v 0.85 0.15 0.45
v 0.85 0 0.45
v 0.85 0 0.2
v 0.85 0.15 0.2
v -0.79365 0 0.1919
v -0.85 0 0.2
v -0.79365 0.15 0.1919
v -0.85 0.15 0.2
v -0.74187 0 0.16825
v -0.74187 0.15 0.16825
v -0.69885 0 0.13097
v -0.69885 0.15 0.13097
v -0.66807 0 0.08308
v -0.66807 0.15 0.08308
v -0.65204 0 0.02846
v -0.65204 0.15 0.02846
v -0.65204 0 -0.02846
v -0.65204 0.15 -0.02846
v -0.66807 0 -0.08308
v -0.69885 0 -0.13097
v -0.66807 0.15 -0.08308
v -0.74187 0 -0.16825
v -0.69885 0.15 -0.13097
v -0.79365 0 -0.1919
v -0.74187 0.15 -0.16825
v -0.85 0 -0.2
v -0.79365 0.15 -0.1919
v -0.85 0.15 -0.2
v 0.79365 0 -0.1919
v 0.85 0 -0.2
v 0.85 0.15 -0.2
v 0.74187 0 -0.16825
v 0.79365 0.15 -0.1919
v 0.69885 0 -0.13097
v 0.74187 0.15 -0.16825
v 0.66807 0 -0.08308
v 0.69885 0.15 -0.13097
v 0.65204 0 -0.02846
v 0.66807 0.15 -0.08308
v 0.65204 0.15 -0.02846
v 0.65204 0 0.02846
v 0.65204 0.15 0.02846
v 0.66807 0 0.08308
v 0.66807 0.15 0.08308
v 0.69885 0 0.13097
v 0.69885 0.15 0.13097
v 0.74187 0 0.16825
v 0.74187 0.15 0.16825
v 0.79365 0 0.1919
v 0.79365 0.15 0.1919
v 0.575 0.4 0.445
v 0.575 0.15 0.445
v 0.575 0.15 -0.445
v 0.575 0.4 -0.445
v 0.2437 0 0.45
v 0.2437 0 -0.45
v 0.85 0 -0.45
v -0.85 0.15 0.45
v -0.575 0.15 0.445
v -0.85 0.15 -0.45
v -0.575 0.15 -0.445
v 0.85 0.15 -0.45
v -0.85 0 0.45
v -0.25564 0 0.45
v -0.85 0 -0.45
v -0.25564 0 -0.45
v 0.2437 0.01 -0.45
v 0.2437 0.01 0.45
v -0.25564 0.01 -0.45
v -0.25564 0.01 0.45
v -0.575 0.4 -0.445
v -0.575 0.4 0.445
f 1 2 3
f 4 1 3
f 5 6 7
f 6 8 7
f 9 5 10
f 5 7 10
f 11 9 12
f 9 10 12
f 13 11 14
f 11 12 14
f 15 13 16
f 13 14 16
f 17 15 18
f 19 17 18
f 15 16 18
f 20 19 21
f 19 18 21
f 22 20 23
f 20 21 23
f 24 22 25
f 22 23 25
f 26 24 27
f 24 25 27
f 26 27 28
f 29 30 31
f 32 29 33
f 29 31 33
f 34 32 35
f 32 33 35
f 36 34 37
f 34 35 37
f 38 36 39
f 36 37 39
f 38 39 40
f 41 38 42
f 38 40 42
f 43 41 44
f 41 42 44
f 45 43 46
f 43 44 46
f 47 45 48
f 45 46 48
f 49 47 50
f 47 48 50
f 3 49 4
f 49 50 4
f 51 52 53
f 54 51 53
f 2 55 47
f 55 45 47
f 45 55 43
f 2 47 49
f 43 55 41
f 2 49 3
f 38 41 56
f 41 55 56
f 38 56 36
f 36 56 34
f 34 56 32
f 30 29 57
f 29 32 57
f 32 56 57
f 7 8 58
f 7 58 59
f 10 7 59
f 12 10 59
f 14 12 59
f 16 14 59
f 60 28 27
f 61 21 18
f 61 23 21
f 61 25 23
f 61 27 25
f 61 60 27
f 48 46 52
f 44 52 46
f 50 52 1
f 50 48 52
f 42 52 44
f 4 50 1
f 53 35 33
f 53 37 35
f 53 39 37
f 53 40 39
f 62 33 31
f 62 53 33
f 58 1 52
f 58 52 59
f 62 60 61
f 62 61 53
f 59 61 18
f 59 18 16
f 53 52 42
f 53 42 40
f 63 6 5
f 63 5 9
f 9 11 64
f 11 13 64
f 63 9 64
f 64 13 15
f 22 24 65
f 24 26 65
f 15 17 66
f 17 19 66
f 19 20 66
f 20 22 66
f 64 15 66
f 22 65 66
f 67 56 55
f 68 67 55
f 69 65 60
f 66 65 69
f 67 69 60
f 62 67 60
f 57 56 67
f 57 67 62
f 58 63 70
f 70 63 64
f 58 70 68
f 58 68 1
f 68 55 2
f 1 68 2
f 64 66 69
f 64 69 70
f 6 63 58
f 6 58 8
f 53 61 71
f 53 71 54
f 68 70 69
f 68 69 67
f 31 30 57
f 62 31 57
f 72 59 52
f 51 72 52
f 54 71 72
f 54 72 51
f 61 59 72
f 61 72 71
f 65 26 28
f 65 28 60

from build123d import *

# Parameters (mm, degrees)
SKETCH1_W           = 1.7
SKETCH1_H           = 0.9
BOSS_EXTRUDE1_DEPTH = 0.15
SKETCH2_R           = 0.2
CUT_EXTRUDE1_DEPTH  = 1.15
SKETCH3_W           = 1.15
SKETCH3_H           = 0.89
BOSS_EXTRUDE3_DEPTH = 0.25
SKETCH4_W           = 0.499334855
SKETCH4_H           = 0.9
CUT_EXTRUDE2_DEPTH  = 0.01


with BuildPart() as part:
    # Sketch1 → Boss-Extrude1 (new body)
    with BuildSketch(Plane(origin=(0, 0, 0), x_dir=(1, 0, 0), z_dir=(0, 1, 0))):
        Rectangle(SKETCH1_W, SKETCH1_H)
    extrude(amount=BOSS_EXTRUDE1_DEPTH)

    # Sketch2 → Cut-Extrude1 (cut, through all)
    with BuildSketch(Plane(origin=(0, 0.15, 0), x_dir=(1, 0, 0), z_dir=(0, 1, 0))):
        with Locations((-0.85, 0)):
            Circle(SKETCH2_R)
        with Locations((0.85, 0)):
            Circle(SKETCH2_R)
    extrude(amount=-CUT_EXTRUDE1_DEPTH, mode=Mode.SUBTRACT)

    # Sketch3 → Boss-Extrude3 (add)
    with BuildSketch(Plane(origin=(0, 0.15, 0), x_dir=(1, 0, 0), z_dir=(0, 1, 0))):
        Rectangle(SKETCH3_W, SKETCH3_H)
    extrude(amount=BOSS_EXTRUDE3_DEPTH)

    # Sketch4 → Cut-Extrude2 (cut)
    with BuildSketch(Plane.XZ):
        with Locations((-0.00596787, 0)):
            Rectangle(SKETCH4_W, SKETCH4_H)
    extrude(amount=-CUT_EXTRUDE2_DEPTH, mode=Mode.SUBTRACT)


solid = part.part
